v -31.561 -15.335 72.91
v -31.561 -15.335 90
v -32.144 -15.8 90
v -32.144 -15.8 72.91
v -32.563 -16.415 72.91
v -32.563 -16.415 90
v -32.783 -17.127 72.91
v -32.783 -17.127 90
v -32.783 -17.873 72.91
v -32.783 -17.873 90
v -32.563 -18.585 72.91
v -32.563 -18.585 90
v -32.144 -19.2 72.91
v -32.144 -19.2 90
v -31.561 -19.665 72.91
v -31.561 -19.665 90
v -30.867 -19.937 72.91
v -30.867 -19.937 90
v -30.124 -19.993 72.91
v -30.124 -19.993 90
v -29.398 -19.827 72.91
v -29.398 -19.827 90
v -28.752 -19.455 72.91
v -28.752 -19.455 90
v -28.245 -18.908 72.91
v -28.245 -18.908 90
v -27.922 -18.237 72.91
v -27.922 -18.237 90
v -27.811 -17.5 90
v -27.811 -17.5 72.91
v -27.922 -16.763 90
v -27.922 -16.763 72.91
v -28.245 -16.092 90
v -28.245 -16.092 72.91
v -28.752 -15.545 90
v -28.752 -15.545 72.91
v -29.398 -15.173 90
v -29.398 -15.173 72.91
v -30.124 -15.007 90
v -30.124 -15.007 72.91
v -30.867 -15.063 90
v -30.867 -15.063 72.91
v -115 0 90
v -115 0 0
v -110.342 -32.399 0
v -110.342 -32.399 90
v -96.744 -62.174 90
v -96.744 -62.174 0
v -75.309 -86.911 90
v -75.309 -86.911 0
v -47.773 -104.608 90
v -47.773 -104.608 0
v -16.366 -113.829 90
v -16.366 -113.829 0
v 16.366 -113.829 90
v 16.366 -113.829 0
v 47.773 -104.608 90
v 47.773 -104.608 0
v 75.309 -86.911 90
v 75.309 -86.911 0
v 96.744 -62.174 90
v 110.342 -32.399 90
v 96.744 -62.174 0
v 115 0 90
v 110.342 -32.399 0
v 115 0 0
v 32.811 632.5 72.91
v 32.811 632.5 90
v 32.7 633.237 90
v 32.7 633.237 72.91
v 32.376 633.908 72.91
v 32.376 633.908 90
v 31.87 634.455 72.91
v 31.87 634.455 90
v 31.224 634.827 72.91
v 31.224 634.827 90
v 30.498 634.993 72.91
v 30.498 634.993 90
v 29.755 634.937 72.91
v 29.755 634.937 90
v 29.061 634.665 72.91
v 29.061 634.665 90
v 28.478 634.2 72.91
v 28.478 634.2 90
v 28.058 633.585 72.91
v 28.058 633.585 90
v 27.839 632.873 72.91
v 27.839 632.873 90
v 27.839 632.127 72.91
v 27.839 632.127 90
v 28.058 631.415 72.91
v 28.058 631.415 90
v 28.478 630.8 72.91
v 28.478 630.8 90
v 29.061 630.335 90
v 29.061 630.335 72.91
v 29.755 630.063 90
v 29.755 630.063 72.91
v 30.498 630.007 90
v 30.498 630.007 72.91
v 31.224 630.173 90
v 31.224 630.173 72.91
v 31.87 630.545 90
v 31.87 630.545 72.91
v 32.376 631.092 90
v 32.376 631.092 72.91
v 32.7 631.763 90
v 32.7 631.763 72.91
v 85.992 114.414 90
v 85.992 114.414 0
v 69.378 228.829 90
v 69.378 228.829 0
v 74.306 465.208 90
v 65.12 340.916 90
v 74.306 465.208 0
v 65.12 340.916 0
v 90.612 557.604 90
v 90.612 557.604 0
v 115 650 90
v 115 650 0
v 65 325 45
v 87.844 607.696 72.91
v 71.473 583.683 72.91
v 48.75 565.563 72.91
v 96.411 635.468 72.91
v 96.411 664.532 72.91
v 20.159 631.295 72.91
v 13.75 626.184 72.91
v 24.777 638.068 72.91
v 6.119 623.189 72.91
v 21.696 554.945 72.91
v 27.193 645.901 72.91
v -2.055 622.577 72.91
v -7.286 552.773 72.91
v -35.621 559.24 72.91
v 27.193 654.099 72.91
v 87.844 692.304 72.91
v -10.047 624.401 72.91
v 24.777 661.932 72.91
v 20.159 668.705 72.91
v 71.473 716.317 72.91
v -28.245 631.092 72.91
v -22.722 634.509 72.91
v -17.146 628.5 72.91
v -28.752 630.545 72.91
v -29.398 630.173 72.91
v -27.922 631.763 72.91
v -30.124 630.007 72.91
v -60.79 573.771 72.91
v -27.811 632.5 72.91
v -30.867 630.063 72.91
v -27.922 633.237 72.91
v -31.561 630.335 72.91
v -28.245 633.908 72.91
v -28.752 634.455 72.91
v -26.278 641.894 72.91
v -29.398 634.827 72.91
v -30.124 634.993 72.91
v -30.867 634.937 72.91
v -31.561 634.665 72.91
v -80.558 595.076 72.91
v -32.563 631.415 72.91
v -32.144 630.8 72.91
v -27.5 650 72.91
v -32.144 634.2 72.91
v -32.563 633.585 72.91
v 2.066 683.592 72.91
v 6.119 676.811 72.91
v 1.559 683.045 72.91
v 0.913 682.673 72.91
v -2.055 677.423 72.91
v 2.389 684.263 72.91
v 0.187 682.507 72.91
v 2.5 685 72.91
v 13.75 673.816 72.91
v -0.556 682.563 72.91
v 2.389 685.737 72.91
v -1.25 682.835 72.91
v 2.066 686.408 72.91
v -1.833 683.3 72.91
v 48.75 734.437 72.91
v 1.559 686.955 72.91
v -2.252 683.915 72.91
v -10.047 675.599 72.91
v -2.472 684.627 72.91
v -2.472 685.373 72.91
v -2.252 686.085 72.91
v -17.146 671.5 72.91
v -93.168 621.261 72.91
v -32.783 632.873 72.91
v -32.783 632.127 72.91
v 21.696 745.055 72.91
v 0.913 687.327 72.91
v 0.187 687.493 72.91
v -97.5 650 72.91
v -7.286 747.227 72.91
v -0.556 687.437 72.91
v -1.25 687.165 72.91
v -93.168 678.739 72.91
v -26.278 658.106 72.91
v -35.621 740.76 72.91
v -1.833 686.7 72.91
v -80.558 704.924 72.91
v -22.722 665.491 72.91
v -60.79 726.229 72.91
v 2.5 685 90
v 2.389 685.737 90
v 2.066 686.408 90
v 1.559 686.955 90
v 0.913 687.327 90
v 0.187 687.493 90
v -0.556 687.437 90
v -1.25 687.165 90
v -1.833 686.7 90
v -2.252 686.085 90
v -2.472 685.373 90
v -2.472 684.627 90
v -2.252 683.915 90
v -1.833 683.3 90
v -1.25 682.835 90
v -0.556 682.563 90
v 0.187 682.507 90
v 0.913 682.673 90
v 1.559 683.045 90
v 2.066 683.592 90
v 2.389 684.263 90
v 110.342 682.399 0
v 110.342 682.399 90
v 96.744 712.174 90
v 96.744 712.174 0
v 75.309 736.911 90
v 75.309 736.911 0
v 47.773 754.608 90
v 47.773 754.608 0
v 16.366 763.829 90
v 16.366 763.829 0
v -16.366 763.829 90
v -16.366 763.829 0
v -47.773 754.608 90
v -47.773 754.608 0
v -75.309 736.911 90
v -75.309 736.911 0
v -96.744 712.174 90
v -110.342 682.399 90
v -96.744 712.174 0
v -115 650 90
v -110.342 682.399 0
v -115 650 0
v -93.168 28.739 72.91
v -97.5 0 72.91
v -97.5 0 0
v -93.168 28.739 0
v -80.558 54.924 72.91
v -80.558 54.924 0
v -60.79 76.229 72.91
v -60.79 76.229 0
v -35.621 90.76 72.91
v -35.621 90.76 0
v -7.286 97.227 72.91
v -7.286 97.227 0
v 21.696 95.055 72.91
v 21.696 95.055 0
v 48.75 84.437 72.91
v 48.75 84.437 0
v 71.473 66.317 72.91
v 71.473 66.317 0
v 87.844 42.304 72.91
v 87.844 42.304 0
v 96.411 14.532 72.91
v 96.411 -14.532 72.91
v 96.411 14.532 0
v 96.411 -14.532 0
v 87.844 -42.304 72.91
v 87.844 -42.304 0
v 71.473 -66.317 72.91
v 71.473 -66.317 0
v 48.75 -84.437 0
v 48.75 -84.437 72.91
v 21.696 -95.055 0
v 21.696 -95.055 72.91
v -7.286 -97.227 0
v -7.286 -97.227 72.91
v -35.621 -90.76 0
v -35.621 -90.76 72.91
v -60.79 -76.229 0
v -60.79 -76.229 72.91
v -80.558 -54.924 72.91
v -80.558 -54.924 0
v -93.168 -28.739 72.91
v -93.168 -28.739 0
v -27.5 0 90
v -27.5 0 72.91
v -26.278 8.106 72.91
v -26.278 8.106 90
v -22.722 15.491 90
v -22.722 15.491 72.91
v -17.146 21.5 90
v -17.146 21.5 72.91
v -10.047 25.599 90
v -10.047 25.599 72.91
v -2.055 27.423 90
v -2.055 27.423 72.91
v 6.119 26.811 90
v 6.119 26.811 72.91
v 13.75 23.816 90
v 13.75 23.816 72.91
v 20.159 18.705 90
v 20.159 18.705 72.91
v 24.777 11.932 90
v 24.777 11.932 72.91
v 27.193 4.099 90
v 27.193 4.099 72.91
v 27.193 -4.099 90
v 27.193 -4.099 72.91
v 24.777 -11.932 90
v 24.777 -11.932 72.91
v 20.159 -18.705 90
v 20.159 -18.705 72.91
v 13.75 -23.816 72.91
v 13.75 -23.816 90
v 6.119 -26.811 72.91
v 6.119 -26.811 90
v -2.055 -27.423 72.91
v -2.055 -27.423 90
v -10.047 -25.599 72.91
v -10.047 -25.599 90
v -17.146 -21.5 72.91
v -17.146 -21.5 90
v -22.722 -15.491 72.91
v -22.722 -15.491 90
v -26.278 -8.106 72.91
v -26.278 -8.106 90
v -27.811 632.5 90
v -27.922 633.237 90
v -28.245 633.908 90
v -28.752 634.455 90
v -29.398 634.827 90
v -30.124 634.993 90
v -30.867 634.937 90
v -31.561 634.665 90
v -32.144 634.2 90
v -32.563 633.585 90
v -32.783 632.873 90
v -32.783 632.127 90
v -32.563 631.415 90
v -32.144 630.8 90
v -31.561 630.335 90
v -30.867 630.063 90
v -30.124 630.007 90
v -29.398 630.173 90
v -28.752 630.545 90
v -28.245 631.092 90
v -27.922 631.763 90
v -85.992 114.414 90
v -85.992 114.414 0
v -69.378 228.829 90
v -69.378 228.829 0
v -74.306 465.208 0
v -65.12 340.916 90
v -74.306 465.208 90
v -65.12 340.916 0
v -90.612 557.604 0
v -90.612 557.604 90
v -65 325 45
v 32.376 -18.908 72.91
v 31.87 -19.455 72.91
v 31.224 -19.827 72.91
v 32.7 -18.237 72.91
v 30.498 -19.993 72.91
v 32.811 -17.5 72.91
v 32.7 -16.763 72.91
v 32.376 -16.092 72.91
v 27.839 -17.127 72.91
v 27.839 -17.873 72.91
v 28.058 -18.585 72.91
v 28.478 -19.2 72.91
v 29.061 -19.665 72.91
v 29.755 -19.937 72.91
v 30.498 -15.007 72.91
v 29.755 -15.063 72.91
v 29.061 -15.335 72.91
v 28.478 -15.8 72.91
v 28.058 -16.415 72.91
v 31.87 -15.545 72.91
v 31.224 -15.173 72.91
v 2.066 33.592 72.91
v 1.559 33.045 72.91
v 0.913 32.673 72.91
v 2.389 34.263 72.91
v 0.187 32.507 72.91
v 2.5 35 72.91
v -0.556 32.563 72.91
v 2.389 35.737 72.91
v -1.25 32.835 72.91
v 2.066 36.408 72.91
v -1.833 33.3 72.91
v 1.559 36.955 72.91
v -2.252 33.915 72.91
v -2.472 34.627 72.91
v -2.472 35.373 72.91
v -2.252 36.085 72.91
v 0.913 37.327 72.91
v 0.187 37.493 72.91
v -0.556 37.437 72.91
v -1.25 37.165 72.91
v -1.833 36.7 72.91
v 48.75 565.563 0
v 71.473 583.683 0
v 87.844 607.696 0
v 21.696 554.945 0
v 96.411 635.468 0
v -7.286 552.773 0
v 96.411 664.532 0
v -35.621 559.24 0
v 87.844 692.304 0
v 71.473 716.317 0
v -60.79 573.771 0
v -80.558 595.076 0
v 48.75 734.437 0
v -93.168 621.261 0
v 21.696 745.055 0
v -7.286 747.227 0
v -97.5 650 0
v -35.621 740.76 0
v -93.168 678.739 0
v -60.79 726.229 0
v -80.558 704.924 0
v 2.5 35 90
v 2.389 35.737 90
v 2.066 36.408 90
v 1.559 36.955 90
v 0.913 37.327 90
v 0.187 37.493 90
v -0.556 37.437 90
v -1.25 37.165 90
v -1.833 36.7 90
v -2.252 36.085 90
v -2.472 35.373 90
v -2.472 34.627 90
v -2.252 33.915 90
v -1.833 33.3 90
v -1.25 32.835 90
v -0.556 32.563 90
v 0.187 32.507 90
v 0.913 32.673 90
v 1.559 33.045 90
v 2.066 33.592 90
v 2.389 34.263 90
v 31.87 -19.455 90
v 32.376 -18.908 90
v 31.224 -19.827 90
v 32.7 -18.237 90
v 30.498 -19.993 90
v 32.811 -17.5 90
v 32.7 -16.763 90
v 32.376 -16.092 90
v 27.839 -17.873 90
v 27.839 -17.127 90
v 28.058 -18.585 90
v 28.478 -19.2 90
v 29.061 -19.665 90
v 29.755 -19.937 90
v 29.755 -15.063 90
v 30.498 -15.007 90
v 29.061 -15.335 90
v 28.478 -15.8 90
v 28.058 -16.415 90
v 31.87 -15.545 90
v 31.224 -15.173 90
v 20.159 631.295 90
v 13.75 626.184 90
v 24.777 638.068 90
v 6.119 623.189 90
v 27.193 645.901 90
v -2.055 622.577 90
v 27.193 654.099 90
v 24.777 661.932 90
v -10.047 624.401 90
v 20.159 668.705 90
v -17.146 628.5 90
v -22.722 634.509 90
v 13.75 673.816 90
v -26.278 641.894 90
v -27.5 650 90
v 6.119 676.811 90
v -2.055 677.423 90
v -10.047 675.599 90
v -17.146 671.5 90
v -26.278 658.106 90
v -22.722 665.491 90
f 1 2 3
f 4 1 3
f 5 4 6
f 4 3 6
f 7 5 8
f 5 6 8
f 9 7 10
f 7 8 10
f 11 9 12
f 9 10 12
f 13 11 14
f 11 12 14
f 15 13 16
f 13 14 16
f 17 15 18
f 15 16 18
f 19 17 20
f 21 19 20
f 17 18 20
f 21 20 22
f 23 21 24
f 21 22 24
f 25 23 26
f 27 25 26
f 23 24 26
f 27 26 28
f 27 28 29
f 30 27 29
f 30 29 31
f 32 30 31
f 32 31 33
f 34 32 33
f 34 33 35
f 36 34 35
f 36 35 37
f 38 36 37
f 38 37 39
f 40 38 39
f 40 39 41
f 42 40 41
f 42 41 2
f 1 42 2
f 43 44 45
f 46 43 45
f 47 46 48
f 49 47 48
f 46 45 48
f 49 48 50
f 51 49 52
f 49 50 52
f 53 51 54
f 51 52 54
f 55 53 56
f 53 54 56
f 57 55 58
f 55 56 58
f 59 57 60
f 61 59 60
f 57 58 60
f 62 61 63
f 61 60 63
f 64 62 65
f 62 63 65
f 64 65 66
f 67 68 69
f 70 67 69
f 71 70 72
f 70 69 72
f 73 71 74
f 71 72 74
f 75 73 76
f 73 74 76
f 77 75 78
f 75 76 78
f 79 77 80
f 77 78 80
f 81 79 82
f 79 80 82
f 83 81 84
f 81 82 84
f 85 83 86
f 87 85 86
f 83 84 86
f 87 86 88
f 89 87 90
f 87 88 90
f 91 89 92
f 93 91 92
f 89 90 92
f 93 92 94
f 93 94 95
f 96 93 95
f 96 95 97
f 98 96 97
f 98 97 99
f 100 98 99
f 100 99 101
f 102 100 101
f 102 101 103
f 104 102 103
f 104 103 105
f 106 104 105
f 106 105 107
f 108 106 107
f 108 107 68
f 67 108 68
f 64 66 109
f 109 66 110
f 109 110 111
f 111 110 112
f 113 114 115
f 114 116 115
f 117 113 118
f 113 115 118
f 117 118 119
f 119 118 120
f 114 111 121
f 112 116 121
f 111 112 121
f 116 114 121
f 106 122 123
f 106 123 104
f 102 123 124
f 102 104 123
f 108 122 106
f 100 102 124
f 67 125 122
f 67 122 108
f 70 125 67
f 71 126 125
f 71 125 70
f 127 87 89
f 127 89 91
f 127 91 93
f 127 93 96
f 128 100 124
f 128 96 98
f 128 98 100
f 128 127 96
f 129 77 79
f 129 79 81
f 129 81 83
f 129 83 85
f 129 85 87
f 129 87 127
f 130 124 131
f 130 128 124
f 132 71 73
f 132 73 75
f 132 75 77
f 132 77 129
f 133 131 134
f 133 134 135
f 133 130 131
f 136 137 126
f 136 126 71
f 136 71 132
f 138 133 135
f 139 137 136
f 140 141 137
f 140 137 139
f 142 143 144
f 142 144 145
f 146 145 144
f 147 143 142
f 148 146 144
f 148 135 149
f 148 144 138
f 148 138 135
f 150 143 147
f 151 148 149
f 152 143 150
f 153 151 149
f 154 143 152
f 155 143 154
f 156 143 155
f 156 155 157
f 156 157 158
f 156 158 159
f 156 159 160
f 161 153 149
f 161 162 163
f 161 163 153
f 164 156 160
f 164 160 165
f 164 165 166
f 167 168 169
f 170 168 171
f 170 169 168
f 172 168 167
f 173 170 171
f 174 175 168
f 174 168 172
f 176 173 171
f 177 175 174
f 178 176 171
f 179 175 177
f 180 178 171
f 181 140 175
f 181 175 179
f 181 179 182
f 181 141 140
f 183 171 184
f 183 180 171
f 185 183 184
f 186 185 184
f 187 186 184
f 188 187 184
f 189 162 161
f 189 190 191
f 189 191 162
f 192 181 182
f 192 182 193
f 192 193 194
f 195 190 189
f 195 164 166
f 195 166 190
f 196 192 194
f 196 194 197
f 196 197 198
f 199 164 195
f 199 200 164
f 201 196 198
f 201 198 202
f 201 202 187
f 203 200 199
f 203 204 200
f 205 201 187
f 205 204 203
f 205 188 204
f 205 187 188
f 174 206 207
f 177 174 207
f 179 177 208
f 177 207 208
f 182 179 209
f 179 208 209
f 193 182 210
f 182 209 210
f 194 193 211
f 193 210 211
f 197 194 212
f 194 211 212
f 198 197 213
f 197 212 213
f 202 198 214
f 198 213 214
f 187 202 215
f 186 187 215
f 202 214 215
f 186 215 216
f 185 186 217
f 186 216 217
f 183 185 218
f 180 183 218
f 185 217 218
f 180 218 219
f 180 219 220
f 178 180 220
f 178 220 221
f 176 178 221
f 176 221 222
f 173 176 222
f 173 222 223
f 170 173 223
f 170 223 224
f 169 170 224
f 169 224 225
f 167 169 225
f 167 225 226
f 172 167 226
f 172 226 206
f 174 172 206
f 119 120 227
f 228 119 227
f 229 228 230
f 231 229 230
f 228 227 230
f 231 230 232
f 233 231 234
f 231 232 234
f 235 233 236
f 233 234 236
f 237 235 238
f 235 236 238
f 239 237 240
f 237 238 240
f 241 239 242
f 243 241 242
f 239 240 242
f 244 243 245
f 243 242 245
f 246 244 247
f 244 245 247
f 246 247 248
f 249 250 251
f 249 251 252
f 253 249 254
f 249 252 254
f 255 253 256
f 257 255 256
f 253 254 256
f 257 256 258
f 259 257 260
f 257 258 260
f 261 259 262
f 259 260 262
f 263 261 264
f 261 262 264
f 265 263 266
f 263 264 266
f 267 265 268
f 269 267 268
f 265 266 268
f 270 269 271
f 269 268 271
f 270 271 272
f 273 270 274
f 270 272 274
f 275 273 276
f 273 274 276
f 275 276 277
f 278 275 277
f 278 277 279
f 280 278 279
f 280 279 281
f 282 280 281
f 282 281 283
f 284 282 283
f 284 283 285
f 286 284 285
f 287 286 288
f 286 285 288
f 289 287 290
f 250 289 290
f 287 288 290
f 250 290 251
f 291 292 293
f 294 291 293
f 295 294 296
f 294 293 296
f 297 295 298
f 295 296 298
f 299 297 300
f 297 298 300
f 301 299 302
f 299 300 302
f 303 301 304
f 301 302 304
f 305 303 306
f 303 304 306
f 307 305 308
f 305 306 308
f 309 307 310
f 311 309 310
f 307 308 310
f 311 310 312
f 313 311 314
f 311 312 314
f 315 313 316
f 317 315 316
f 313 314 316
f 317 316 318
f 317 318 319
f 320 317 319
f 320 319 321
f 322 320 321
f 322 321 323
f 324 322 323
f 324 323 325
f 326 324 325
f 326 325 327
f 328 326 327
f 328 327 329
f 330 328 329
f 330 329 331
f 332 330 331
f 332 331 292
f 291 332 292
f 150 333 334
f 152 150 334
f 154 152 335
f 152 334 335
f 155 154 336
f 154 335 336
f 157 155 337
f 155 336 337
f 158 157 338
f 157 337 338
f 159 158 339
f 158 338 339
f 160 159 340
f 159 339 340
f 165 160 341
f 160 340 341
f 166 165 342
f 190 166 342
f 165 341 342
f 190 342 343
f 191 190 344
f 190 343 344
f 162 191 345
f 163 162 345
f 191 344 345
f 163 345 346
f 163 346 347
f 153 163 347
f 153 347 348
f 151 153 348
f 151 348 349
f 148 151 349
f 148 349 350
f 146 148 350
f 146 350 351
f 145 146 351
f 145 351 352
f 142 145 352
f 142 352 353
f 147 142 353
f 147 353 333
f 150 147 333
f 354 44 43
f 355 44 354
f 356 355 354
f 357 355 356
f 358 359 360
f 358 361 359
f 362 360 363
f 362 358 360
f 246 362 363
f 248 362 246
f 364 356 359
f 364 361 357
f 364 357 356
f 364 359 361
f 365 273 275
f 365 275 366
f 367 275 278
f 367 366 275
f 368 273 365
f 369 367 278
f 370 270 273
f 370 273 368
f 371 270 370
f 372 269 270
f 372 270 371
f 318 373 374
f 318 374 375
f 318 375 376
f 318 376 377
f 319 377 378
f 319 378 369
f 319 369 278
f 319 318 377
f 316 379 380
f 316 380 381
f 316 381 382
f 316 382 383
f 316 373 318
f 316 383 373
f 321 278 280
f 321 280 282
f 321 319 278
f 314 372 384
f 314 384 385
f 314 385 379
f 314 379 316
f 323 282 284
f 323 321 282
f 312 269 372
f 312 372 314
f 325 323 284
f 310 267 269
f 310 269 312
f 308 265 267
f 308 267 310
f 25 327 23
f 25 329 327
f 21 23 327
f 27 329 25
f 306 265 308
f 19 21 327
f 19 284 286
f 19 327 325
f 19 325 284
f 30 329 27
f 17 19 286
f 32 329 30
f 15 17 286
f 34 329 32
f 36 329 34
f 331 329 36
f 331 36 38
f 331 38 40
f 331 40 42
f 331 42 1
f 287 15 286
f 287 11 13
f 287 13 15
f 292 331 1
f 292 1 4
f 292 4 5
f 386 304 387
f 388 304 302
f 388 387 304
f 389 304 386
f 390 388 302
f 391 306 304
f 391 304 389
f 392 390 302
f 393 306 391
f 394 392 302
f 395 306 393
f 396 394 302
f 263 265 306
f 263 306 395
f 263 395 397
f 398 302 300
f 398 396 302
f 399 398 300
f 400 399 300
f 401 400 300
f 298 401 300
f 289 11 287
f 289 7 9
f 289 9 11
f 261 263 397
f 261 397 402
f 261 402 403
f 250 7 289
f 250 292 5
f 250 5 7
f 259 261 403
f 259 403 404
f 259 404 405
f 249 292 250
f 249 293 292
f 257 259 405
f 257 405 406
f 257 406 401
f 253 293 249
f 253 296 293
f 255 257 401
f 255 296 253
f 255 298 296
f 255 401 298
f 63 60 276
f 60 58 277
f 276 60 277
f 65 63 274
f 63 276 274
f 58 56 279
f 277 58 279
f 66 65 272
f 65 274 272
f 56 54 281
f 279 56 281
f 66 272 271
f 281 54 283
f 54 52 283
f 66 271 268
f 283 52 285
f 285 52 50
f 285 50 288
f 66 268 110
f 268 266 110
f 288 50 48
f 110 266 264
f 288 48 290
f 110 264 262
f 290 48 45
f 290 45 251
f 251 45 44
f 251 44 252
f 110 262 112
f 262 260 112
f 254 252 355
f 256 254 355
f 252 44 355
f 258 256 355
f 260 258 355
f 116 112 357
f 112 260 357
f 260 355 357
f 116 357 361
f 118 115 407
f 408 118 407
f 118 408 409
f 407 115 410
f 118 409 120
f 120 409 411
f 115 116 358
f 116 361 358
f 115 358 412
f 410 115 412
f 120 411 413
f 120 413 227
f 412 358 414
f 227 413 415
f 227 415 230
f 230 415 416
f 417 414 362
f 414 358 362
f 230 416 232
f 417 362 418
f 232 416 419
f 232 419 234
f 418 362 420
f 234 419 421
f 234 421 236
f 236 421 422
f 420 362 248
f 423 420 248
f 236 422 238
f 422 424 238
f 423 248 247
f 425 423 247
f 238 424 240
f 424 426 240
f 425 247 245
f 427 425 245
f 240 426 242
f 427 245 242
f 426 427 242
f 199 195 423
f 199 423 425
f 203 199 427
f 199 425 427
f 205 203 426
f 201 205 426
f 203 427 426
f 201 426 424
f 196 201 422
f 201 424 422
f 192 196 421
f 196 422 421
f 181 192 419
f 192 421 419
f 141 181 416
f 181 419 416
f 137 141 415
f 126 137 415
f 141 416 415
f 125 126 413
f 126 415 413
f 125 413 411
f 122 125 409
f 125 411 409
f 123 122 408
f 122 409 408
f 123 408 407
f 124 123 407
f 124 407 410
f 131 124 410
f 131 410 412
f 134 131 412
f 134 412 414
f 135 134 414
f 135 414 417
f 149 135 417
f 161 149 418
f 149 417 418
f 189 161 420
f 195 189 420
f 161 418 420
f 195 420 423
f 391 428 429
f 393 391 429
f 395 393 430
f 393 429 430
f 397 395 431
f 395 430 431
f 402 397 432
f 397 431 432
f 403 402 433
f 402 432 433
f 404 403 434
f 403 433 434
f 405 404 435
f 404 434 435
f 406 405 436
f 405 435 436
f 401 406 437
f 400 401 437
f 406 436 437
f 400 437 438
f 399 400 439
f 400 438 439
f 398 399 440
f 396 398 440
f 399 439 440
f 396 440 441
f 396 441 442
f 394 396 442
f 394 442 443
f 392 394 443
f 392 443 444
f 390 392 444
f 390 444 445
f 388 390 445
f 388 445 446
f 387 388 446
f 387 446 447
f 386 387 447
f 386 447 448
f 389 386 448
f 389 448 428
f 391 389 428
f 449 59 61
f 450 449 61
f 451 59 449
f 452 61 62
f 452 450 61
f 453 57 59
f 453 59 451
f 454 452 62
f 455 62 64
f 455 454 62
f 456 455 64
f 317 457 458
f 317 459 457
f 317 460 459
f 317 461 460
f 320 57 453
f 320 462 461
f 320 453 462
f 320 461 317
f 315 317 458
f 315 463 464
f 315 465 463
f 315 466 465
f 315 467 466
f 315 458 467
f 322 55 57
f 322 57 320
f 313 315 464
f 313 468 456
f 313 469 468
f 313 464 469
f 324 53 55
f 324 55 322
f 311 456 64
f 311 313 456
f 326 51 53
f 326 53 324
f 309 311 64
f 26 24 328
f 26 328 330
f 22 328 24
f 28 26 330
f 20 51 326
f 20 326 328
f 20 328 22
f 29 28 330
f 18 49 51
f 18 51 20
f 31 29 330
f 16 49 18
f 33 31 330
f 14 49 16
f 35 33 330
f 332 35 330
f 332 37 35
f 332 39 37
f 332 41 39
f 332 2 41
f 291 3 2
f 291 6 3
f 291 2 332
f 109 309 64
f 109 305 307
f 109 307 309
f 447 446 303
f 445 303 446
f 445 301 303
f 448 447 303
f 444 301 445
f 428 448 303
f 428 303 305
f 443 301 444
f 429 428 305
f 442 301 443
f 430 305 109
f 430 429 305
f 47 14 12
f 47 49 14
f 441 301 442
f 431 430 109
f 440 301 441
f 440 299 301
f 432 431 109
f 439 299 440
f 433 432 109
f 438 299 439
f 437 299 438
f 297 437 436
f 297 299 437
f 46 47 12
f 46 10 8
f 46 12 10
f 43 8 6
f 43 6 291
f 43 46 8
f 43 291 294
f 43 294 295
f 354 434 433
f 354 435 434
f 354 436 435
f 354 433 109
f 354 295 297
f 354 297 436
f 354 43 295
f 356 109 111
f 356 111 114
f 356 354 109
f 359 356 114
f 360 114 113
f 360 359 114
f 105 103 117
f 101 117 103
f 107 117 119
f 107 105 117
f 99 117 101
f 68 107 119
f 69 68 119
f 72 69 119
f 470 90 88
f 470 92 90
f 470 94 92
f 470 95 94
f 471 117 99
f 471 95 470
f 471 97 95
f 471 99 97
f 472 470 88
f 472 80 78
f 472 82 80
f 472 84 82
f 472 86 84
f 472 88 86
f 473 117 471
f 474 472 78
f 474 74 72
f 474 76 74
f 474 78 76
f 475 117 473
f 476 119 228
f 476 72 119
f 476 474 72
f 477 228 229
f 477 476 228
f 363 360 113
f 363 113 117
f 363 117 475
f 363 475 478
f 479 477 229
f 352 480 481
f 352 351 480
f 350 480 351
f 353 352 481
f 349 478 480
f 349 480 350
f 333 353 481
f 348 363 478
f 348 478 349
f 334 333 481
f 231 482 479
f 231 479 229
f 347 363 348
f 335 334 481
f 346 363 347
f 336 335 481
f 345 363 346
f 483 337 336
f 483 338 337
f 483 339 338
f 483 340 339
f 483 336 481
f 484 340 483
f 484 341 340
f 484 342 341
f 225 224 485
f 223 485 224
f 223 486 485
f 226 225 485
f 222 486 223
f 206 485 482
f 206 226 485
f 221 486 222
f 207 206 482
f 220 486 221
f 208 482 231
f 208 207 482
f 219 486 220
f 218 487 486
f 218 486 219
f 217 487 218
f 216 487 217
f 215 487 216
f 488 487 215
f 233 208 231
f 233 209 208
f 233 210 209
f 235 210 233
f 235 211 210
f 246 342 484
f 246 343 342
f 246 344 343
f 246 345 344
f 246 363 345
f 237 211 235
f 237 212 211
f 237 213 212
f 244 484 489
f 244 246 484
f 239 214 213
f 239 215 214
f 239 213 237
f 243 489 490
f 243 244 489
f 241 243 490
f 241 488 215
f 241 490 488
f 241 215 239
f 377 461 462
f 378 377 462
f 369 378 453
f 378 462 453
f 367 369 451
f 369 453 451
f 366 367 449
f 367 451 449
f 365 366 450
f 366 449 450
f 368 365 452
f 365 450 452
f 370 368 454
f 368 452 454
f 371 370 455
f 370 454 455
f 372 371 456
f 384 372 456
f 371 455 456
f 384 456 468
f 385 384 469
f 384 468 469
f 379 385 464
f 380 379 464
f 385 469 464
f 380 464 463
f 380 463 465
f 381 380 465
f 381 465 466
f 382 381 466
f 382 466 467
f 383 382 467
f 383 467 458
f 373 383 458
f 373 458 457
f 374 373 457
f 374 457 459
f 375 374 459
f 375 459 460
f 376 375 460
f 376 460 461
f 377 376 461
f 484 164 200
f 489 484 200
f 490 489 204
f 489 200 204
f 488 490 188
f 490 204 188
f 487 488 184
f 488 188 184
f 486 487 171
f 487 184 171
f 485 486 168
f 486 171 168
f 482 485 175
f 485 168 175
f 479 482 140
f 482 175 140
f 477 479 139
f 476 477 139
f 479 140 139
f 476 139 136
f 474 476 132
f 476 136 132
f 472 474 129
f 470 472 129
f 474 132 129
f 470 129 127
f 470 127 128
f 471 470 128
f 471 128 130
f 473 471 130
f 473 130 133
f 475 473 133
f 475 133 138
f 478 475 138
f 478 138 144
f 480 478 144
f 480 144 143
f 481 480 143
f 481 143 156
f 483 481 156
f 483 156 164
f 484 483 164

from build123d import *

# Parameters (mm, degrees)
BOSS_EXTRUDE1_DEPTH = 90
SKETCH2_R           = 97.5
CUT_EXTRUDE1_DEPTH  = 72.91
SKETCH4_R           = 2.5
CUT_EXTRUDE3_DEPTH  = 20
SKETCH3_R           = 27.5
CUT_EXTRUDE4_DEPTH  = 20
CIRPATTERN2_COUNT   = 3
SKETCH6_R           = 97.5
CUT_EXTRUDE5_DEPTH  = 72.91
SKETCH7_R           = 27.5
CUT_EXTRUDE6_DEPTH  = 72.91
SKETCH8_R           = 2.5
SKETCH8_R_2         = 27.5
CUT_EXTRUDE7_DEPTH  = 72.91


with BuildPart() as part:
    # Sketch1 → Boss-Extrude1 (new body)
    with BuildSketch(Plane(origin=(0, 0, 0), x_dir=(0, 1, 0), z_dir=(0, 0, 1))):
        with BuildLine():
            ThreePointArc((0, 115), (-115, 0), (0, -115))
            add(Edge.make_bspline(
                [(0, -115), (325, -15), (650, -115)],
                knots=[0, 0, 0, 1, 1, 1], degree=2))
            ThreePointArc((650, -115), (765, 0), (650, 115))
            add(Edge.make_bspline(
                [(0, 115), (325, 15), (650, 115)],
                knots=[0, 0, 0, 1, 1, 1], degree=2))
        make_face()
    extrude(amount=BOSS_EXTRUDE1_DEPTH)

    # Sketch2 → Cut-Extrude1 (cut)
    with BuildSketch(Plane(origin=(0, 0, 0), x_dir=(1, 0, 0), z_dir=(0, 0, -1))):
        with Locations(Location((0, 0, 0), (0, 0, 180))):
            Circle(SKETCH2_R)
    extrude(amount=-CUT_EXTRUDE1_DEPTH, mode=Mode.SUBTRACT)

    # Sketch4 → Cut-Extrude3 (cut)
    with BuildSketch(Plane.XY.offset(90)):
        with Locations((0, 35)):
            Circle(SKETCH4_R)
    cut_extrude3 = extrude(amount=-CUT_EXTRUDE3_DEPTH, mode=Mode.SUBTRACT)

    # Sketch3 → Cut-Extrude4 (cut)
    with BuildSketch(Plane(origin=(0, 0, 72.91), x_dir=(1, 0, 0), z_dir=(0, 0, -1))):
        with Locations(Location((0, 0, 0), (0, 0, 180))):
            Circle(SKETCH3_R)
    extrude(amount=-CUT_EXTRUDE4_DEPTH, mode=Mode.SUBTRACT)

    # CirPattern2: Cut-Extrude3 ×3 about axis
    cirpattern2_axis = Axis((0, 0, 0), (0, 0, 1))
    for i in range(1, CIRPATTERN2_COUNT):
        add(cut_extrude3.rotate(cirpattern2_axis, i * 360 / CIRPATTERN2_COUNT), mode=Mode.SUBTRACT)

    # Sketch6 → Cut-Extrude5 (cut)
    with BuildSketch(Plane(origin=(0, 0, 0), x_dir=(1, 0, 0), z_dir=(0, 0, -1))):
        with Locations(Location((0, -650, 0), (0, 0, 180))):
            Circle(SKETCH6_R)
    extrude(amount=-CUT_EXTRUDE5_DEPTH, mode=Mode.SUBTRACT)

    # Sketch7 → Cut-Extrude6 (cut)
    with BuildSketch(Plane(origin=(0, 0, 72.91), x_dir=(1, 0, 0), z_dir=(0, 0, -1))):
        with Locations(Location((0, -650, 0), (0, 0, 180))):
            Circle(SKETCH7_R)
    extrude(amount=-CUT_EXTRUDE6_DEPTH, mode=Mode.SUBTRACT)

    # Sketch8 → Cut-Extrude7 (cut)
    with BuildSketch(Plane.XY.offset(90)):
        with Locations((-30.310889132, 632.5)):
            Circle(SKETCH8_R)
        with Locations((0, 685)):
            Circle(SKETCH8_R)
        with Locations((30.310889132, 632.5)):
            Circle(SKETCH8_R)
        with Locations(Location((30.310889132, -17.5, 0), (0, 0, 240))):
            Circle(SKETCH8_R)
        with Locations((0, 35)):
            Circle(SKETCH8_R)
        with Locations(Location((-30.310889132, -17.5, 0), (0, 0, 120))):
            Circle(SKETCH8_R)
        with Locations(Location((0, 650, 0), (0, 0, 180))):
            Circle(SKETCH8_R_2)
    extrude(amount=-CUT_EXTRUDE7_DEPTH, mode=Mode.SUBTRACT)


solid = part.part
